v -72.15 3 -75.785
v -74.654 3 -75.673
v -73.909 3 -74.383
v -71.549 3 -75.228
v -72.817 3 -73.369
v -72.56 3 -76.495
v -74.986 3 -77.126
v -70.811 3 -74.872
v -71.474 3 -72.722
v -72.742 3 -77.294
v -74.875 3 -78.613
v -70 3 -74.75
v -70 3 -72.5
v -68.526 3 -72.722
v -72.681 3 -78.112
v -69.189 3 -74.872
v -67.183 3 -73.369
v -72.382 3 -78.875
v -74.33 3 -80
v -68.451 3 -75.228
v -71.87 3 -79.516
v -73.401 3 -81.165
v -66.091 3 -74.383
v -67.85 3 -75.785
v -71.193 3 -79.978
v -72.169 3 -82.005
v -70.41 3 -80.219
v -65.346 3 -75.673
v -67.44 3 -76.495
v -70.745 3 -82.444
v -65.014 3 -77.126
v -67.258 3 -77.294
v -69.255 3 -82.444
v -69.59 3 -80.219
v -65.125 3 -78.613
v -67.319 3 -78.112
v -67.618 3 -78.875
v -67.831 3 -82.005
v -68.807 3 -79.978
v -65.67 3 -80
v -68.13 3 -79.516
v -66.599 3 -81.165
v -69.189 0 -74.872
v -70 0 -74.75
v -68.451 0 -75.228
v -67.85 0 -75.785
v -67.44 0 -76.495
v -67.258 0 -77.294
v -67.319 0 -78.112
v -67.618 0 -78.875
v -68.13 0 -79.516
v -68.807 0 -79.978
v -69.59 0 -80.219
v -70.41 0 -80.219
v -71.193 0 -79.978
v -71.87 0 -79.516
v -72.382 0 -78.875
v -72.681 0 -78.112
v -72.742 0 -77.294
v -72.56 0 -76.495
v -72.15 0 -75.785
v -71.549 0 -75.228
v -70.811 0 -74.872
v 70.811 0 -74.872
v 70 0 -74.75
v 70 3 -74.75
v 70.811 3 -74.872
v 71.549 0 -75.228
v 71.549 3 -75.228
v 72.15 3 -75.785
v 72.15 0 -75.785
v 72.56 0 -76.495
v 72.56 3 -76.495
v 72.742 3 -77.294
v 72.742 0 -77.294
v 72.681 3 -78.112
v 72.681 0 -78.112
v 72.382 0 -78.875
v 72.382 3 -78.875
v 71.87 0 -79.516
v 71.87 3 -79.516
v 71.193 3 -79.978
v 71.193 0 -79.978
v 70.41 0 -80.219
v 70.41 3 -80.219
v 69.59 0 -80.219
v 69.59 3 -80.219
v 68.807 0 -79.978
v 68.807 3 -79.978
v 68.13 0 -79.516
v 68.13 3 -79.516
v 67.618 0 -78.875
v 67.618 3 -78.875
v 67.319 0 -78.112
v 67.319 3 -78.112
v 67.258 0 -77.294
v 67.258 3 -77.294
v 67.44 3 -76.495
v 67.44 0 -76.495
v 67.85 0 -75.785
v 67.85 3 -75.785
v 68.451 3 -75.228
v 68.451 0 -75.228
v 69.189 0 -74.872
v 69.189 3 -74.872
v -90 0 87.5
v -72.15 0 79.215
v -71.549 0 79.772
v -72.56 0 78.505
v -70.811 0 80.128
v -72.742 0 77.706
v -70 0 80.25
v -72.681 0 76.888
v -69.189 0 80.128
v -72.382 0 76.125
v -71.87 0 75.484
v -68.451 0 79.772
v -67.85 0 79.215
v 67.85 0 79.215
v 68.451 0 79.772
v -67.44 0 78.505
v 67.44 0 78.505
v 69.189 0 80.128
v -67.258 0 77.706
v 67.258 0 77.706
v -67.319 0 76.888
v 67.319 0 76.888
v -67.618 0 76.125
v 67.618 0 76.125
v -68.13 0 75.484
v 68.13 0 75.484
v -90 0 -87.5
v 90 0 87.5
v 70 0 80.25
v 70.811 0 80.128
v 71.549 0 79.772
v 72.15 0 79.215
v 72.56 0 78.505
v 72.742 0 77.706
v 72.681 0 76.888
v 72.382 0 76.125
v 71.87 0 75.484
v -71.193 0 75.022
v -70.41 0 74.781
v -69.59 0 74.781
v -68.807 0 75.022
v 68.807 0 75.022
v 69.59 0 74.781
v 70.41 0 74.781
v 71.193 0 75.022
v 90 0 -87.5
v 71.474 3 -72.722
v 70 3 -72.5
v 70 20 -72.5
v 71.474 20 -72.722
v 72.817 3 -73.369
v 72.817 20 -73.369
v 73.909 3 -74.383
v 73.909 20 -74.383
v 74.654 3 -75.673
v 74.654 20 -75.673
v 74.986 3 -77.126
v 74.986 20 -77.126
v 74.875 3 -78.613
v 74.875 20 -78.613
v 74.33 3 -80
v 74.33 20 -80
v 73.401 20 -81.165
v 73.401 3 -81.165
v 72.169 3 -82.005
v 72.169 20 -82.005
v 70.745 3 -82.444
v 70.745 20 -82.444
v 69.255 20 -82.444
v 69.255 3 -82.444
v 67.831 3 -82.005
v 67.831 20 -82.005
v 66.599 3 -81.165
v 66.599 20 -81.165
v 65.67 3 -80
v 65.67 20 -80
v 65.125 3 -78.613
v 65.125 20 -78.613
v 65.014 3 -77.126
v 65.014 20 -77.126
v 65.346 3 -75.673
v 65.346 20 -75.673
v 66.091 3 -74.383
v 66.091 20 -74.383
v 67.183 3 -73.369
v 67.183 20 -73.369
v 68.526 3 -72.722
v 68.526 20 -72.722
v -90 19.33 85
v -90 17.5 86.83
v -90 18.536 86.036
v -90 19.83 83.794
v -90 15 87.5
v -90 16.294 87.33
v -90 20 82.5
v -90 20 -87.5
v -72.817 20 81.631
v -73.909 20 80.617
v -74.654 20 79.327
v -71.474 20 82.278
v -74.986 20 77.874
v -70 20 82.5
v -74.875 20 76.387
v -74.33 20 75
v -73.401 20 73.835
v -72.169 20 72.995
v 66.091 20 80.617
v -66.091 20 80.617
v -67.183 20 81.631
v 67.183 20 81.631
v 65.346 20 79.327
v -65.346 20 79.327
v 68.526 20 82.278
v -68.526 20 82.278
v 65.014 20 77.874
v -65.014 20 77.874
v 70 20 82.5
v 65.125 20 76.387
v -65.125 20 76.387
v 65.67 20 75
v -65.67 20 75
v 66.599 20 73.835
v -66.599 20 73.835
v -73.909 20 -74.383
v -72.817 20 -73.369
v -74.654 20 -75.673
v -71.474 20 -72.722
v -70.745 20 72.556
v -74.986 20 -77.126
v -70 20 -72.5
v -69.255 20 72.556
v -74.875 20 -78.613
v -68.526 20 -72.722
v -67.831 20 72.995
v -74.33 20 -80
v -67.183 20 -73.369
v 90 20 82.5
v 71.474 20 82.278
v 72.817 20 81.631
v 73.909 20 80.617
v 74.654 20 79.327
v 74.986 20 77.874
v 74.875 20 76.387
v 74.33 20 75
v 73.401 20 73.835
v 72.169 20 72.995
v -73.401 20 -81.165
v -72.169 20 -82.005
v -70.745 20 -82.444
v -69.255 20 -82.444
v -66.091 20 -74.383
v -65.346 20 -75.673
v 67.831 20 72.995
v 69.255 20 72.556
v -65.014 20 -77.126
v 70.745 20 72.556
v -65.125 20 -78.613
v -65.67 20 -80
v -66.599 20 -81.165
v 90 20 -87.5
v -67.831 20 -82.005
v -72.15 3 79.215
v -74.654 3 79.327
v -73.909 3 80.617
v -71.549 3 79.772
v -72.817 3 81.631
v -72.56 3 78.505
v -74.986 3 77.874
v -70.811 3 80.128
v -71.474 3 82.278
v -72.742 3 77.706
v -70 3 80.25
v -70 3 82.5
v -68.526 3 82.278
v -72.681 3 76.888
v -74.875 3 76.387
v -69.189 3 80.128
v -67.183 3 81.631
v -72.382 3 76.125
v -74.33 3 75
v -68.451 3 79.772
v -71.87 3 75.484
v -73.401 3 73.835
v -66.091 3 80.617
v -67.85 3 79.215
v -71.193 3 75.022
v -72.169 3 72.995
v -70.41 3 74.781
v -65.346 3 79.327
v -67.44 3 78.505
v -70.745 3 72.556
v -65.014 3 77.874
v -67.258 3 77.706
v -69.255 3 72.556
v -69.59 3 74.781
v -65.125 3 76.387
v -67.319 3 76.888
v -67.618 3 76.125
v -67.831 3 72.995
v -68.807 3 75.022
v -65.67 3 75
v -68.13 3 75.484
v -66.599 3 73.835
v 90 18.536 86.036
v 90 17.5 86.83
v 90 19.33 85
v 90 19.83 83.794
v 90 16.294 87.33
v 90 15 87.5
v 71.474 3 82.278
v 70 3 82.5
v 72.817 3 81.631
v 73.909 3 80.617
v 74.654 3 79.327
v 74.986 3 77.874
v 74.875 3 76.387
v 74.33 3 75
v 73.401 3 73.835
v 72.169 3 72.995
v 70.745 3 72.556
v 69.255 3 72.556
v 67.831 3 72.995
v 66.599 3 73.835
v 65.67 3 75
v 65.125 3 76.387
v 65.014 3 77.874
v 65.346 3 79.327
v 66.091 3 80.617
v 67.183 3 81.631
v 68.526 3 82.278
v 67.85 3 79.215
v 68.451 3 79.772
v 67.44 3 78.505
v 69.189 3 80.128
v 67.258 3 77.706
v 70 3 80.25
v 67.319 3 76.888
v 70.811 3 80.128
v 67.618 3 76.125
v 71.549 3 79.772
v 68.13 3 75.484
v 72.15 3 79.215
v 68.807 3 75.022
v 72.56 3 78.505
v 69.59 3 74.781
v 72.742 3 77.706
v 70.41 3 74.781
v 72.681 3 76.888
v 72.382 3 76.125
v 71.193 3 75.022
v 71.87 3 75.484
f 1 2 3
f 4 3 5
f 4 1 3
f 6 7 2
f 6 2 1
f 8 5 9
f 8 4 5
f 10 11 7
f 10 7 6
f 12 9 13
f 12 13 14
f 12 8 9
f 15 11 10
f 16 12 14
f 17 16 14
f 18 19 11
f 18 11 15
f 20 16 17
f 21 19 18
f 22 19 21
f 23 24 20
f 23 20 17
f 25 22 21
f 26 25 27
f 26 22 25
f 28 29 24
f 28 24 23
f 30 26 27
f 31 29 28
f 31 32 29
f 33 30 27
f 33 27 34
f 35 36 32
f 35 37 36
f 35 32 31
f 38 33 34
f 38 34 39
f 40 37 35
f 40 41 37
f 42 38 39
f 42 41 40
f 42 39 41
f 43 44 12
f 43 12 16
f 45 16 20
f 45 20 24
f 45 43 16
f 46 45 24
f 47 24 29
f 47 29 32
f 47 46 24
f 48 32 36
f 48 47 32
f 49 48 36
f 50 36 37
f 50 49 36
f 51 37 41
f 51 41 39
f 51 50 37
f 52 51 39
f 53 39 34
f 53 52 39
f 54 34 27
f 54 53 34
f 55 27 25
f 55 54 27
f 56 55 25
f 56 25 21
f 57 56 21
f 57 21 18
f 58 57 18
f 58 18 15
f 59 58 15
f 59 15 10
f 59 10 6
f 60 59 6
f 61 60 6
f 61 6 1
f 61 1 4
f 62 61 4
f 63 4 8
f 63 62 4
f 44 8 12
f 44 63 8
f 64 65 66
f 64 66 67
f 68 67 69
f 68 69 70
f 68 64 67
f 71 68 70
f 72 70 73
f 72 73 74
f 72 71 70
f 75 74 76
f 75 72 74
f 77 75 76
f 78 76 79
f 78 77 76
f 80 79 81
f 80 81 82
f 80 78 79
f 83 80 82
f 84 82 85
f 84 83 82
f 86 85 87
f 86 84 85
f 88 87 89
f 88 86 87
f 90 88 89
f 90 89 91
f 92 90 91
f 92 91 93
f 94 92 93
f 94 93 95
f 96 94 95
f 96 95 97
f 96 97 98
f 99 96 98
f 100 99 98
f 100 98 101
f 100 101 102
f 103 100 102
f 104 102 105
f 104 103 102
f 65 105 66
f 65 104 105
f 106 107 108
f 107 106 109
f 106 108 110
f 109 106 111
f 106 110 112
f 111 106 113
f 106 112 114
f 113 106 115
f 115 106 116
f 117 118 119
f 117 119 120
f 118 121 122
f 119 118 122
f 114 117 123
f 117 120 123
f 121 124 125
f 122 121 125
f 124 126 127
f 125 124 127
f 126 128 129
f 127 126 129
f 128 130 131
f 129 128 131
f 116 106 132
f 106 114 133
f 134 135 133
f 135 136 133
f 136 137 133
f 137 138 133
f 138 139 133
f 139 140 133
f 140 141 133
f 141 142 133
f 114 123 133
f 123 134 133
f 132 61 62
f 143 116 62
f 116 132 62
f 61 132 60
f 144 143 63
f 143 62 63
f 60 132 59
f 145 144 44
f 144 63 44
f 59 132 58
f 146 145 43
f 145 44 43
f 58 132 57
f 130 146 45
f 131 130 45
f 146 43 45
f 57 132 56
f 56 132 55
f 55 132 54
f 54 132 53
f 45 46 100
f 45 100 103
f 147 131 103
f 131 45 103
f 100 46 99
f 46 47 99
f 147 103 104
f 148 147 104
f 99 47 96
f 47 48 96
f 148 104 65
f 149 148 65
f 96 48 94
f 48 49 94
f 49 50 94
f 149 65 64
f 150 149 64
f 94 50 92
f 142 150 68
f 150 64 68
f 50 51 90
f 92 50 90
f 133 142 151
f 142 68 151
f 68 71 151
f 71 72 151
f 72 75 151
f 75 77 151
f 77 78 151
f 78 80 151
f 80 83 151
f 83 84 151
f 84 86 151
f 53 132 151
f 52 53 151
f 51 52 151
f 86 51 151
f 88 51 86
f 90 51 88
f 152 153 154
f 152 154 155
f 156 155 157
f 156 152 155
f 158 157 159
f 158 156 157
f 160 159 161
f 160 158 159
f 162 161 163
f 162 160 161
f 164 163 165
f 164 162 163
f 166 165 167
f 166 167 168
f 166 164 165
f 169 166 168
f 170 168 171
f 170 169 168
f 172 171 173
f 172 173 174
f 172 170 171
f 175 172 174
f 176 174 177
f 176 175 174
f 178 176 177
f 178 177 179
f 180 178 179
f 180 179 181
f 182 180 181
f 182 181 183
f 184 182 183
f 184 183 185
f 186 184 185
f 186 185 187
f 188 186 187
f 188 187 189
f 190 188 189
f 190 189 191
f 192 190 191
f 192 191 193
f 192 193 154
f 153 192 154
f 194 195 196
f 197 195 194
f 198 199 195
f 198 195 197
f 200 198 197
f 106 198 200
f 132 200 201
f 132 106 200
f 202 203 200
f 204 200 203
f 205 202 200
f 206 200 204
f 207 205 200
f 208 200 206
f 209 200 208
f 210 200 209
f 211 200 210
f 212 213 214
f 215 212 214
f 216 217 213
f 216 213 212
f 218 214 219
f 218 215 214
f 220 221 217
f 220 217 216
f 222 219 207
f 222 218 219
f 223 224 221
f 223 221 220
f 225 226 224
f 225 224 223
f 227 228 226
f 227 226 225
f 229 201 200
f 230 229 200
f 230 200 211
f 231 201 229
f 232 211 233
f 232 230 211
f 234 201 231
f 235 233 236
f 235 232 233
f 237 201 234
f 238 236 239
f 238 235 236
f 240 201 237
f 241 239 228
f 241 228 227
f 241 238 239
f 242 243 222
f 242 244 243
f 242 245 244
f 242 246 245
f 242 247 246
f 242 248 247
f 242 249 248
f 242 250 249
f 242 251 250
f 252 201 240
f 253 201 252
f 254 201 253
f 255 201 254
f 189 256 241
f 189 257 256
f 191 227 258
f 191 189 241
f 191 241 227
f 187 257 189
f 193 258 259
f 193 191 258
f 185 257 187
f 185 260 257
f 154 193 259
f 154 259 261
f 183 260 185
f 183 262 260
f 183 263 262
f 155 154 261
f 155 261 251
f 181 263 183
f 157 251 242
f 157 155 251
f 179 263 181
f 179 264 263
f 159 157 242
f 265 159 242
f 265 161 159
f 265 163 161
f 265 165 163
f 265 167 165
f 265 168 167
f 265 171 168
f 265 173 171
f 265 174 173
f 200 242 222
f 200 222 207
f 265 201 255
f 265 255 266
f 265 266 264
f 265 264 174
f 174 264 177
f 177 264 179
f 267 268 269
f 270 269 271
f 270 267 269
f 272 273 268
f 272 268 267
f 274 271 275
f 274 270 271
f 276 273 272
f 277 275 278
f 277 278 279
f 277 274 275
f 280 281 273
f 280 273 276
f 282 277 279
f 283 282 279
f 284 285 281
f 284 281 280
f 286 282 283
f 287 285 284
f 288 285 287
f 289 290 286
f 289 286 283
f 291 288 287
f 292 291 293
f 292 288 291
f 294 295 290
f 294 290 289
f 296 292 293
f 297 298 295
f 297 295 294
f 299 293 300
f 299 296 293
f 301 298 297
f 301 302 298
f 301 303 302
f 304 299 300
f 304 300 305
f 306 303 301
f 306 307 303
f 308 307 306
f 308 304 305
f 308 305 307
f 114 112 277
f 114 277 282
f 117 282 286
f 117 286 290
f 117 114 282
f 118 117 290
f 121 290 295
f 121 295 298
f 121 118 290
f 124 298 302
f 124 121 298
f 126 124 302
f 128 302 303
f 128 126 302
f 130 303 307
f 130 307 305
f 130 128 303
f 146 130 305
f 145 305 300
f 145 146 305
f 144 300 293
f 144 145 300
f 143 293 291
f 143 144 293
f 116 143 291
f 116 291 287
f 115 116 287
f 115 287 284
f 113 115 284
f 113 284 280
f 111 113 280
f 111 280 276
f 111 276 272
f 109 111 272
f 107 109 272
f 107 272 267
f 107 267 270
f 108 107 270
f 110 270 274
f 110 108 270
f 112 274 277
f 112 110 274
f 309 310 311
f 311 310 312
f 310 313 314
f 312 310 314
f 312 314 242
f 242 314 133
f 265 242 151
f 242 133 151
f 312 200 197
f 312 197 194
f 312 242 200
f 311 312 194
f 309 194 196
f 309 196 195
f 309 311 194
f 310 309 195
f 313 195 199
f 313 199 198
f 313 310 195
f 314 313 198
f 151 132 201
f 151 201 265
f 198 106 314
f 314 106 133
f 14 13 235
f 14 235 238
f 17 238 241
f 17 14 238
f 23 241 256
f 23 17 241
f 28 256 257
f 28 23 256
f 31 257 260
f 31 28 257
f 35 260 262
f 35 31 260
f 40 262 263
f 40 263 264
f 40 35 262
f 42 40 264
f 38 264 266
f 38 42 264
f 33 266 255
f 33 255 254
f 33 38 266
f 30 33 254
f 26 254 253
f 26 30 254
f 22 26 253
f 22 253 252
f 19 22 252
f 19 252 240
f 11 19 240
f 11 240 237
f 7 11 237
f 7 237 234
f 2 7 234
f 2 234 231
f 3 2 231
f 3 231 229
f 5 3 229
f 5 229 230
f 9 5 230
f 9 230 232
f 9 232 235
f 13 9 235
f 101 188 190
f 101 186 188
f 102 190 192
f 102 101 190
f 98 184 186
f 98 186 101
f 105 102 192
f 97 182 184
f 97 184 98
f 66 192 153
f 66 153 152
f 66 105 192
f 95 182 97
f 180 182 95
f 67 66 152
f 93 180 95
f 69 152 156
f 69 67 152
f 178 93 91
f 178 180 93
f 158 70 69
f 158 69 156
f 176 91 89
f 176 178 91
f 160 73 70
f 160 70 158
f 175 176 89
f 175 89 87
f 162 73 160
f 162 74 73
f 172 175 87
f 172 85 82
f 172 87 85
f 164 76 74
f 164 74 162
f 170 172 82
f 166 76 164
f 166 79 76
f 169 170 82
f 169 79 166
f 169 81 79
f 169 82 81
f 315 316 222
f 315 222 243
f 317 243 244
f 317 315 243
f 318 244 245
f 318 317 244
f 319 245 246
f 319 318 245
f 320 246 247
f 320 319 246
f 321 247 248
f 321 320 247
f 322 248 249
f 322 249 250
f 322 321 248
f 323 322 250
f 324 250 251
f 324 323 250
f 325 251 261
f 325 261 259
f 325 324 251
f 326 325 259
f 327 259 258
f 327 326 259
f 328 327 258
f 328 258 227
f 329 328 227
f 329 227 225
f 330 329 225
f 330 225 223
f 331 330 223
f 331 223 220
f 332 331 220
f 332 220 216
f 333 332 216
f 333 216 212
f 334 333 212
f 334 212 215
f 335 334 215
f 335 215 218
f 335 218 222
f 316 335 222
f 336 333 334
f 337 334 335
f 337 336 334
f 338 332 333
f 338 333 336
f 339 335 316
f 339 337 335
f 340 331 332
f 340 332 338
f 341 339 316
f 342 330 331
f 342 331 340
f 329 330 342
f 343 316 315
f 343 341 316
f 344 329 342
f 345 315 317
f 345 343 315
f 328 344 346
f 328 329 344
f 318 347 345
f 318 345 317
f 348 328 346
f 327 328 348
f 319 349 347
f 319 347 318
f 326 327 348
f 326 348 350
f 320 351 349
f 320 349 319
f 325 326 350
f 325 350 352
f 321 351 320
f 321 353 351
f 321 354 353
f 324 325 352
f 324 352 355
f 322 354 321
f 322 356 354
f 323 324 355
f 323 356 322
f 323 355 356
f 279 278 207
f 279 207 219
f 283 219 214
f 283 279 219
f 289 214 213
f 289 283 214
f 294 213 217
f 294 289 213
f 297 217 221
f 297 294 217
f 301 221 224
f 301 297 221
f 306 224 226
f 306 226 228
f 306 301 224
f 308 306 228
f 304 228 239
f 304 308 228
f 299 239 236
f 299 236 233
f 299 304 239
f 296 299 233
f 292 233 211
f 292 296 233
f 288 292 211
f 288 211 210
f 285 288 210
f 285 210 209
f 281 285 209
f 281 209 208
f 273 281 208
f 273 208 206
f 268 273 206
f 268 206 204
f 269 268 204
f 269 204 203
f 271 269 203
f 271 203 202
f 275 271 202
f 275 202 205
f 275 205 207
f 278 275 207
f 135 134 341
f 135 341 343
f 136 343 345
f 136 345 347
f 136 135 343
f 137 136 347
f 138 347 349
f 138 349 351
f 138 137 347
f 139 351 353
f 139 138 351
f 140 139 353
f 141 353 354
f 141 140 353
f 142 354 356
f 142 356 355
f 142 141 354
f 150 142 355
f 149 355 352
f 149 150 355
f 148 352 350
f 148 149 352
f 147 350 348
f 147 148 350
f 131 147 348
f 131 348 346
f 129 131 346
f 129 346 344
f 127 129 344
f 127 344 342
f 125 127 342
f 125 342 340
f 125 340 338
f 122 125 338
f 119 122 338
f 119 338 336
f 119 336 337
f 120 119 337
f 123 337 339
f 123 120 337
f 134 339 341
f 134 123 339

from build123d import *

# Parameters (mm, degrees)
SZKIC1_W                    = 180
SZKIC1_H                    = 175
SZKIC1_R                    = 5
SZKIC1_R_2                  = 2.75
DODANIE_WYCI_GNI_CIE1_DEPTH = 3
SZKIC1_4_W                  = 180
SZKIC1_4_H                  = 175
SZKIC1_4_R                  = 5
DODANIE_WYCI_GNI_CIE2_DEPTH = 20
ZAOKR_GLENIE1_R             = 5


with BuildPart() as part:
    # Szkic1 → Dodanie-wyciągnięcie1 (new body)
    # profile 1 of 5: a face of its own
    with BuildSketch(Plane(origin=(0, 0, 0), x_dir=(1, 0, 0), z_dir=(0, 1, 0))):
        Rectangle(SZKIC1_W, SZKIC1_H)
        with Locations((70, -77.5)):
            Circle(SZKIC1_R, mode=Mode.SUBTRACT)
        with Locations((-70, -77.5)):
            Circle(SZKIC1_R, mode=Mode.SUBTRACT)
        with Locations((70, 77.5)):
            Circle(SZKIC1_R, mode=Mode.SUBTRACT)
        with Locations((-70, 77.5)):
            Circle(SZKIC1_R, mode=Mode.SUBTRACT)
    # profile 2 of 5: a face of its own
    with BuildSketch(Plane(origin=(0, 0, 0), x_dir=(1, 0, 0), z_dir=(0, 1, 0))):
        with Locations((-70, -77.5)):
            Circle(SZKIC1_R)
        with Locations(Location((-70, -77.5, 0), (0, 0, 270))):
            Circle(SZKIC1_R_2, mode=Mode.SUBTRACT)
    # profile 3 of 5: a face of its own
    with BuildSketch(Plane(origin=(0, 0, 0), x_dir=(1, 0, 0), z_dir=(0, 1, 0))):
        with Locations((-70, 77.5)):
            Circle(SZKIC1_R)
        with Locations(Location((-70, 77.5, 0), (0, 0, 270))):
            Circle(SZKIC1_R_2, mode=Mode.SUBTRACT)
    # profile 4 of 5: a face of its own
    with BuildSketch(Plane(origin=(0, 0, 0), x_dir=(1, 0, 0), z_dir=(0, 1, 0))):
        with Locations((70, 77.5)):
            Circle(SZKIC1_R)
        with Locations(Location((70, 77.5, 0), (0, 0, 270))):
            Circle(SZKIC1_R_2, mode=Mode.SUBTRACT)
    # profile 5 of 5: a face of its own
    with BuildSketch(Plane(origin=(0, 0, 0), x_dir=(1, 0, 0), z_dir=(0, 1, 0))):
        with Locations((70, -77.5)):
            Circle(SZKIC1_R)
        with Locations(Location((70, -77.5, 0), (0, 0, 270))):
            Circle(SZKIC1_R_2, mode=Mode.SUBTRACT)
    extrude(amount=DODANIE_WYCI_GNI_CIE1_DEPTH)

    # Szkic1<4> → Dodanie-wyciągnięcie2 (add)
    with BuildSketch(Plane(origin=(0, 0, 0), x_dir=(1, 0, 0), z_dir=(0, 1, 0))):
        Rectangle(SZKIC1_4_W, SZKIC1_4_H)
        with Locations(Location((70, -77.5, 0), (0, 0, 270))):
            Circle(SZKIC1_4_R, mode=Mode.SUBTRACT)
        with Locations(Location((-70, -77.5, 0), (0, 0, 270))):
            Circle(SZKIC1_4_R, mode=Mode.SUBTRACT)
        with Locations(Location((70, 77.5, 0), (0, 0, 270))):
            Circle(SZKIC1_4_R, mode=Mode.SUBTRACT)
        with Locations(Location((-70, 77.5, 0), (0, 0, 270))):
            Circle(SZKIC1_4_R, mode=Mode.SUBTRACT)
    extrude(amount=DODANIE_WYCI_GNI_CIE2_DEPTH)

    # Zaokrąglenie1
    zaokr_glenie1_edges = [part.edges().sort_by_distance(p)[0] for p in [
        (0, 20, 87.5),
    ]]
    fillet(zaokr_glenie1_edges, radius=ZAOKR_GLENIE1_R - 0.0001)  # a hair under: the kernel refuses the full size


solid = part.part
